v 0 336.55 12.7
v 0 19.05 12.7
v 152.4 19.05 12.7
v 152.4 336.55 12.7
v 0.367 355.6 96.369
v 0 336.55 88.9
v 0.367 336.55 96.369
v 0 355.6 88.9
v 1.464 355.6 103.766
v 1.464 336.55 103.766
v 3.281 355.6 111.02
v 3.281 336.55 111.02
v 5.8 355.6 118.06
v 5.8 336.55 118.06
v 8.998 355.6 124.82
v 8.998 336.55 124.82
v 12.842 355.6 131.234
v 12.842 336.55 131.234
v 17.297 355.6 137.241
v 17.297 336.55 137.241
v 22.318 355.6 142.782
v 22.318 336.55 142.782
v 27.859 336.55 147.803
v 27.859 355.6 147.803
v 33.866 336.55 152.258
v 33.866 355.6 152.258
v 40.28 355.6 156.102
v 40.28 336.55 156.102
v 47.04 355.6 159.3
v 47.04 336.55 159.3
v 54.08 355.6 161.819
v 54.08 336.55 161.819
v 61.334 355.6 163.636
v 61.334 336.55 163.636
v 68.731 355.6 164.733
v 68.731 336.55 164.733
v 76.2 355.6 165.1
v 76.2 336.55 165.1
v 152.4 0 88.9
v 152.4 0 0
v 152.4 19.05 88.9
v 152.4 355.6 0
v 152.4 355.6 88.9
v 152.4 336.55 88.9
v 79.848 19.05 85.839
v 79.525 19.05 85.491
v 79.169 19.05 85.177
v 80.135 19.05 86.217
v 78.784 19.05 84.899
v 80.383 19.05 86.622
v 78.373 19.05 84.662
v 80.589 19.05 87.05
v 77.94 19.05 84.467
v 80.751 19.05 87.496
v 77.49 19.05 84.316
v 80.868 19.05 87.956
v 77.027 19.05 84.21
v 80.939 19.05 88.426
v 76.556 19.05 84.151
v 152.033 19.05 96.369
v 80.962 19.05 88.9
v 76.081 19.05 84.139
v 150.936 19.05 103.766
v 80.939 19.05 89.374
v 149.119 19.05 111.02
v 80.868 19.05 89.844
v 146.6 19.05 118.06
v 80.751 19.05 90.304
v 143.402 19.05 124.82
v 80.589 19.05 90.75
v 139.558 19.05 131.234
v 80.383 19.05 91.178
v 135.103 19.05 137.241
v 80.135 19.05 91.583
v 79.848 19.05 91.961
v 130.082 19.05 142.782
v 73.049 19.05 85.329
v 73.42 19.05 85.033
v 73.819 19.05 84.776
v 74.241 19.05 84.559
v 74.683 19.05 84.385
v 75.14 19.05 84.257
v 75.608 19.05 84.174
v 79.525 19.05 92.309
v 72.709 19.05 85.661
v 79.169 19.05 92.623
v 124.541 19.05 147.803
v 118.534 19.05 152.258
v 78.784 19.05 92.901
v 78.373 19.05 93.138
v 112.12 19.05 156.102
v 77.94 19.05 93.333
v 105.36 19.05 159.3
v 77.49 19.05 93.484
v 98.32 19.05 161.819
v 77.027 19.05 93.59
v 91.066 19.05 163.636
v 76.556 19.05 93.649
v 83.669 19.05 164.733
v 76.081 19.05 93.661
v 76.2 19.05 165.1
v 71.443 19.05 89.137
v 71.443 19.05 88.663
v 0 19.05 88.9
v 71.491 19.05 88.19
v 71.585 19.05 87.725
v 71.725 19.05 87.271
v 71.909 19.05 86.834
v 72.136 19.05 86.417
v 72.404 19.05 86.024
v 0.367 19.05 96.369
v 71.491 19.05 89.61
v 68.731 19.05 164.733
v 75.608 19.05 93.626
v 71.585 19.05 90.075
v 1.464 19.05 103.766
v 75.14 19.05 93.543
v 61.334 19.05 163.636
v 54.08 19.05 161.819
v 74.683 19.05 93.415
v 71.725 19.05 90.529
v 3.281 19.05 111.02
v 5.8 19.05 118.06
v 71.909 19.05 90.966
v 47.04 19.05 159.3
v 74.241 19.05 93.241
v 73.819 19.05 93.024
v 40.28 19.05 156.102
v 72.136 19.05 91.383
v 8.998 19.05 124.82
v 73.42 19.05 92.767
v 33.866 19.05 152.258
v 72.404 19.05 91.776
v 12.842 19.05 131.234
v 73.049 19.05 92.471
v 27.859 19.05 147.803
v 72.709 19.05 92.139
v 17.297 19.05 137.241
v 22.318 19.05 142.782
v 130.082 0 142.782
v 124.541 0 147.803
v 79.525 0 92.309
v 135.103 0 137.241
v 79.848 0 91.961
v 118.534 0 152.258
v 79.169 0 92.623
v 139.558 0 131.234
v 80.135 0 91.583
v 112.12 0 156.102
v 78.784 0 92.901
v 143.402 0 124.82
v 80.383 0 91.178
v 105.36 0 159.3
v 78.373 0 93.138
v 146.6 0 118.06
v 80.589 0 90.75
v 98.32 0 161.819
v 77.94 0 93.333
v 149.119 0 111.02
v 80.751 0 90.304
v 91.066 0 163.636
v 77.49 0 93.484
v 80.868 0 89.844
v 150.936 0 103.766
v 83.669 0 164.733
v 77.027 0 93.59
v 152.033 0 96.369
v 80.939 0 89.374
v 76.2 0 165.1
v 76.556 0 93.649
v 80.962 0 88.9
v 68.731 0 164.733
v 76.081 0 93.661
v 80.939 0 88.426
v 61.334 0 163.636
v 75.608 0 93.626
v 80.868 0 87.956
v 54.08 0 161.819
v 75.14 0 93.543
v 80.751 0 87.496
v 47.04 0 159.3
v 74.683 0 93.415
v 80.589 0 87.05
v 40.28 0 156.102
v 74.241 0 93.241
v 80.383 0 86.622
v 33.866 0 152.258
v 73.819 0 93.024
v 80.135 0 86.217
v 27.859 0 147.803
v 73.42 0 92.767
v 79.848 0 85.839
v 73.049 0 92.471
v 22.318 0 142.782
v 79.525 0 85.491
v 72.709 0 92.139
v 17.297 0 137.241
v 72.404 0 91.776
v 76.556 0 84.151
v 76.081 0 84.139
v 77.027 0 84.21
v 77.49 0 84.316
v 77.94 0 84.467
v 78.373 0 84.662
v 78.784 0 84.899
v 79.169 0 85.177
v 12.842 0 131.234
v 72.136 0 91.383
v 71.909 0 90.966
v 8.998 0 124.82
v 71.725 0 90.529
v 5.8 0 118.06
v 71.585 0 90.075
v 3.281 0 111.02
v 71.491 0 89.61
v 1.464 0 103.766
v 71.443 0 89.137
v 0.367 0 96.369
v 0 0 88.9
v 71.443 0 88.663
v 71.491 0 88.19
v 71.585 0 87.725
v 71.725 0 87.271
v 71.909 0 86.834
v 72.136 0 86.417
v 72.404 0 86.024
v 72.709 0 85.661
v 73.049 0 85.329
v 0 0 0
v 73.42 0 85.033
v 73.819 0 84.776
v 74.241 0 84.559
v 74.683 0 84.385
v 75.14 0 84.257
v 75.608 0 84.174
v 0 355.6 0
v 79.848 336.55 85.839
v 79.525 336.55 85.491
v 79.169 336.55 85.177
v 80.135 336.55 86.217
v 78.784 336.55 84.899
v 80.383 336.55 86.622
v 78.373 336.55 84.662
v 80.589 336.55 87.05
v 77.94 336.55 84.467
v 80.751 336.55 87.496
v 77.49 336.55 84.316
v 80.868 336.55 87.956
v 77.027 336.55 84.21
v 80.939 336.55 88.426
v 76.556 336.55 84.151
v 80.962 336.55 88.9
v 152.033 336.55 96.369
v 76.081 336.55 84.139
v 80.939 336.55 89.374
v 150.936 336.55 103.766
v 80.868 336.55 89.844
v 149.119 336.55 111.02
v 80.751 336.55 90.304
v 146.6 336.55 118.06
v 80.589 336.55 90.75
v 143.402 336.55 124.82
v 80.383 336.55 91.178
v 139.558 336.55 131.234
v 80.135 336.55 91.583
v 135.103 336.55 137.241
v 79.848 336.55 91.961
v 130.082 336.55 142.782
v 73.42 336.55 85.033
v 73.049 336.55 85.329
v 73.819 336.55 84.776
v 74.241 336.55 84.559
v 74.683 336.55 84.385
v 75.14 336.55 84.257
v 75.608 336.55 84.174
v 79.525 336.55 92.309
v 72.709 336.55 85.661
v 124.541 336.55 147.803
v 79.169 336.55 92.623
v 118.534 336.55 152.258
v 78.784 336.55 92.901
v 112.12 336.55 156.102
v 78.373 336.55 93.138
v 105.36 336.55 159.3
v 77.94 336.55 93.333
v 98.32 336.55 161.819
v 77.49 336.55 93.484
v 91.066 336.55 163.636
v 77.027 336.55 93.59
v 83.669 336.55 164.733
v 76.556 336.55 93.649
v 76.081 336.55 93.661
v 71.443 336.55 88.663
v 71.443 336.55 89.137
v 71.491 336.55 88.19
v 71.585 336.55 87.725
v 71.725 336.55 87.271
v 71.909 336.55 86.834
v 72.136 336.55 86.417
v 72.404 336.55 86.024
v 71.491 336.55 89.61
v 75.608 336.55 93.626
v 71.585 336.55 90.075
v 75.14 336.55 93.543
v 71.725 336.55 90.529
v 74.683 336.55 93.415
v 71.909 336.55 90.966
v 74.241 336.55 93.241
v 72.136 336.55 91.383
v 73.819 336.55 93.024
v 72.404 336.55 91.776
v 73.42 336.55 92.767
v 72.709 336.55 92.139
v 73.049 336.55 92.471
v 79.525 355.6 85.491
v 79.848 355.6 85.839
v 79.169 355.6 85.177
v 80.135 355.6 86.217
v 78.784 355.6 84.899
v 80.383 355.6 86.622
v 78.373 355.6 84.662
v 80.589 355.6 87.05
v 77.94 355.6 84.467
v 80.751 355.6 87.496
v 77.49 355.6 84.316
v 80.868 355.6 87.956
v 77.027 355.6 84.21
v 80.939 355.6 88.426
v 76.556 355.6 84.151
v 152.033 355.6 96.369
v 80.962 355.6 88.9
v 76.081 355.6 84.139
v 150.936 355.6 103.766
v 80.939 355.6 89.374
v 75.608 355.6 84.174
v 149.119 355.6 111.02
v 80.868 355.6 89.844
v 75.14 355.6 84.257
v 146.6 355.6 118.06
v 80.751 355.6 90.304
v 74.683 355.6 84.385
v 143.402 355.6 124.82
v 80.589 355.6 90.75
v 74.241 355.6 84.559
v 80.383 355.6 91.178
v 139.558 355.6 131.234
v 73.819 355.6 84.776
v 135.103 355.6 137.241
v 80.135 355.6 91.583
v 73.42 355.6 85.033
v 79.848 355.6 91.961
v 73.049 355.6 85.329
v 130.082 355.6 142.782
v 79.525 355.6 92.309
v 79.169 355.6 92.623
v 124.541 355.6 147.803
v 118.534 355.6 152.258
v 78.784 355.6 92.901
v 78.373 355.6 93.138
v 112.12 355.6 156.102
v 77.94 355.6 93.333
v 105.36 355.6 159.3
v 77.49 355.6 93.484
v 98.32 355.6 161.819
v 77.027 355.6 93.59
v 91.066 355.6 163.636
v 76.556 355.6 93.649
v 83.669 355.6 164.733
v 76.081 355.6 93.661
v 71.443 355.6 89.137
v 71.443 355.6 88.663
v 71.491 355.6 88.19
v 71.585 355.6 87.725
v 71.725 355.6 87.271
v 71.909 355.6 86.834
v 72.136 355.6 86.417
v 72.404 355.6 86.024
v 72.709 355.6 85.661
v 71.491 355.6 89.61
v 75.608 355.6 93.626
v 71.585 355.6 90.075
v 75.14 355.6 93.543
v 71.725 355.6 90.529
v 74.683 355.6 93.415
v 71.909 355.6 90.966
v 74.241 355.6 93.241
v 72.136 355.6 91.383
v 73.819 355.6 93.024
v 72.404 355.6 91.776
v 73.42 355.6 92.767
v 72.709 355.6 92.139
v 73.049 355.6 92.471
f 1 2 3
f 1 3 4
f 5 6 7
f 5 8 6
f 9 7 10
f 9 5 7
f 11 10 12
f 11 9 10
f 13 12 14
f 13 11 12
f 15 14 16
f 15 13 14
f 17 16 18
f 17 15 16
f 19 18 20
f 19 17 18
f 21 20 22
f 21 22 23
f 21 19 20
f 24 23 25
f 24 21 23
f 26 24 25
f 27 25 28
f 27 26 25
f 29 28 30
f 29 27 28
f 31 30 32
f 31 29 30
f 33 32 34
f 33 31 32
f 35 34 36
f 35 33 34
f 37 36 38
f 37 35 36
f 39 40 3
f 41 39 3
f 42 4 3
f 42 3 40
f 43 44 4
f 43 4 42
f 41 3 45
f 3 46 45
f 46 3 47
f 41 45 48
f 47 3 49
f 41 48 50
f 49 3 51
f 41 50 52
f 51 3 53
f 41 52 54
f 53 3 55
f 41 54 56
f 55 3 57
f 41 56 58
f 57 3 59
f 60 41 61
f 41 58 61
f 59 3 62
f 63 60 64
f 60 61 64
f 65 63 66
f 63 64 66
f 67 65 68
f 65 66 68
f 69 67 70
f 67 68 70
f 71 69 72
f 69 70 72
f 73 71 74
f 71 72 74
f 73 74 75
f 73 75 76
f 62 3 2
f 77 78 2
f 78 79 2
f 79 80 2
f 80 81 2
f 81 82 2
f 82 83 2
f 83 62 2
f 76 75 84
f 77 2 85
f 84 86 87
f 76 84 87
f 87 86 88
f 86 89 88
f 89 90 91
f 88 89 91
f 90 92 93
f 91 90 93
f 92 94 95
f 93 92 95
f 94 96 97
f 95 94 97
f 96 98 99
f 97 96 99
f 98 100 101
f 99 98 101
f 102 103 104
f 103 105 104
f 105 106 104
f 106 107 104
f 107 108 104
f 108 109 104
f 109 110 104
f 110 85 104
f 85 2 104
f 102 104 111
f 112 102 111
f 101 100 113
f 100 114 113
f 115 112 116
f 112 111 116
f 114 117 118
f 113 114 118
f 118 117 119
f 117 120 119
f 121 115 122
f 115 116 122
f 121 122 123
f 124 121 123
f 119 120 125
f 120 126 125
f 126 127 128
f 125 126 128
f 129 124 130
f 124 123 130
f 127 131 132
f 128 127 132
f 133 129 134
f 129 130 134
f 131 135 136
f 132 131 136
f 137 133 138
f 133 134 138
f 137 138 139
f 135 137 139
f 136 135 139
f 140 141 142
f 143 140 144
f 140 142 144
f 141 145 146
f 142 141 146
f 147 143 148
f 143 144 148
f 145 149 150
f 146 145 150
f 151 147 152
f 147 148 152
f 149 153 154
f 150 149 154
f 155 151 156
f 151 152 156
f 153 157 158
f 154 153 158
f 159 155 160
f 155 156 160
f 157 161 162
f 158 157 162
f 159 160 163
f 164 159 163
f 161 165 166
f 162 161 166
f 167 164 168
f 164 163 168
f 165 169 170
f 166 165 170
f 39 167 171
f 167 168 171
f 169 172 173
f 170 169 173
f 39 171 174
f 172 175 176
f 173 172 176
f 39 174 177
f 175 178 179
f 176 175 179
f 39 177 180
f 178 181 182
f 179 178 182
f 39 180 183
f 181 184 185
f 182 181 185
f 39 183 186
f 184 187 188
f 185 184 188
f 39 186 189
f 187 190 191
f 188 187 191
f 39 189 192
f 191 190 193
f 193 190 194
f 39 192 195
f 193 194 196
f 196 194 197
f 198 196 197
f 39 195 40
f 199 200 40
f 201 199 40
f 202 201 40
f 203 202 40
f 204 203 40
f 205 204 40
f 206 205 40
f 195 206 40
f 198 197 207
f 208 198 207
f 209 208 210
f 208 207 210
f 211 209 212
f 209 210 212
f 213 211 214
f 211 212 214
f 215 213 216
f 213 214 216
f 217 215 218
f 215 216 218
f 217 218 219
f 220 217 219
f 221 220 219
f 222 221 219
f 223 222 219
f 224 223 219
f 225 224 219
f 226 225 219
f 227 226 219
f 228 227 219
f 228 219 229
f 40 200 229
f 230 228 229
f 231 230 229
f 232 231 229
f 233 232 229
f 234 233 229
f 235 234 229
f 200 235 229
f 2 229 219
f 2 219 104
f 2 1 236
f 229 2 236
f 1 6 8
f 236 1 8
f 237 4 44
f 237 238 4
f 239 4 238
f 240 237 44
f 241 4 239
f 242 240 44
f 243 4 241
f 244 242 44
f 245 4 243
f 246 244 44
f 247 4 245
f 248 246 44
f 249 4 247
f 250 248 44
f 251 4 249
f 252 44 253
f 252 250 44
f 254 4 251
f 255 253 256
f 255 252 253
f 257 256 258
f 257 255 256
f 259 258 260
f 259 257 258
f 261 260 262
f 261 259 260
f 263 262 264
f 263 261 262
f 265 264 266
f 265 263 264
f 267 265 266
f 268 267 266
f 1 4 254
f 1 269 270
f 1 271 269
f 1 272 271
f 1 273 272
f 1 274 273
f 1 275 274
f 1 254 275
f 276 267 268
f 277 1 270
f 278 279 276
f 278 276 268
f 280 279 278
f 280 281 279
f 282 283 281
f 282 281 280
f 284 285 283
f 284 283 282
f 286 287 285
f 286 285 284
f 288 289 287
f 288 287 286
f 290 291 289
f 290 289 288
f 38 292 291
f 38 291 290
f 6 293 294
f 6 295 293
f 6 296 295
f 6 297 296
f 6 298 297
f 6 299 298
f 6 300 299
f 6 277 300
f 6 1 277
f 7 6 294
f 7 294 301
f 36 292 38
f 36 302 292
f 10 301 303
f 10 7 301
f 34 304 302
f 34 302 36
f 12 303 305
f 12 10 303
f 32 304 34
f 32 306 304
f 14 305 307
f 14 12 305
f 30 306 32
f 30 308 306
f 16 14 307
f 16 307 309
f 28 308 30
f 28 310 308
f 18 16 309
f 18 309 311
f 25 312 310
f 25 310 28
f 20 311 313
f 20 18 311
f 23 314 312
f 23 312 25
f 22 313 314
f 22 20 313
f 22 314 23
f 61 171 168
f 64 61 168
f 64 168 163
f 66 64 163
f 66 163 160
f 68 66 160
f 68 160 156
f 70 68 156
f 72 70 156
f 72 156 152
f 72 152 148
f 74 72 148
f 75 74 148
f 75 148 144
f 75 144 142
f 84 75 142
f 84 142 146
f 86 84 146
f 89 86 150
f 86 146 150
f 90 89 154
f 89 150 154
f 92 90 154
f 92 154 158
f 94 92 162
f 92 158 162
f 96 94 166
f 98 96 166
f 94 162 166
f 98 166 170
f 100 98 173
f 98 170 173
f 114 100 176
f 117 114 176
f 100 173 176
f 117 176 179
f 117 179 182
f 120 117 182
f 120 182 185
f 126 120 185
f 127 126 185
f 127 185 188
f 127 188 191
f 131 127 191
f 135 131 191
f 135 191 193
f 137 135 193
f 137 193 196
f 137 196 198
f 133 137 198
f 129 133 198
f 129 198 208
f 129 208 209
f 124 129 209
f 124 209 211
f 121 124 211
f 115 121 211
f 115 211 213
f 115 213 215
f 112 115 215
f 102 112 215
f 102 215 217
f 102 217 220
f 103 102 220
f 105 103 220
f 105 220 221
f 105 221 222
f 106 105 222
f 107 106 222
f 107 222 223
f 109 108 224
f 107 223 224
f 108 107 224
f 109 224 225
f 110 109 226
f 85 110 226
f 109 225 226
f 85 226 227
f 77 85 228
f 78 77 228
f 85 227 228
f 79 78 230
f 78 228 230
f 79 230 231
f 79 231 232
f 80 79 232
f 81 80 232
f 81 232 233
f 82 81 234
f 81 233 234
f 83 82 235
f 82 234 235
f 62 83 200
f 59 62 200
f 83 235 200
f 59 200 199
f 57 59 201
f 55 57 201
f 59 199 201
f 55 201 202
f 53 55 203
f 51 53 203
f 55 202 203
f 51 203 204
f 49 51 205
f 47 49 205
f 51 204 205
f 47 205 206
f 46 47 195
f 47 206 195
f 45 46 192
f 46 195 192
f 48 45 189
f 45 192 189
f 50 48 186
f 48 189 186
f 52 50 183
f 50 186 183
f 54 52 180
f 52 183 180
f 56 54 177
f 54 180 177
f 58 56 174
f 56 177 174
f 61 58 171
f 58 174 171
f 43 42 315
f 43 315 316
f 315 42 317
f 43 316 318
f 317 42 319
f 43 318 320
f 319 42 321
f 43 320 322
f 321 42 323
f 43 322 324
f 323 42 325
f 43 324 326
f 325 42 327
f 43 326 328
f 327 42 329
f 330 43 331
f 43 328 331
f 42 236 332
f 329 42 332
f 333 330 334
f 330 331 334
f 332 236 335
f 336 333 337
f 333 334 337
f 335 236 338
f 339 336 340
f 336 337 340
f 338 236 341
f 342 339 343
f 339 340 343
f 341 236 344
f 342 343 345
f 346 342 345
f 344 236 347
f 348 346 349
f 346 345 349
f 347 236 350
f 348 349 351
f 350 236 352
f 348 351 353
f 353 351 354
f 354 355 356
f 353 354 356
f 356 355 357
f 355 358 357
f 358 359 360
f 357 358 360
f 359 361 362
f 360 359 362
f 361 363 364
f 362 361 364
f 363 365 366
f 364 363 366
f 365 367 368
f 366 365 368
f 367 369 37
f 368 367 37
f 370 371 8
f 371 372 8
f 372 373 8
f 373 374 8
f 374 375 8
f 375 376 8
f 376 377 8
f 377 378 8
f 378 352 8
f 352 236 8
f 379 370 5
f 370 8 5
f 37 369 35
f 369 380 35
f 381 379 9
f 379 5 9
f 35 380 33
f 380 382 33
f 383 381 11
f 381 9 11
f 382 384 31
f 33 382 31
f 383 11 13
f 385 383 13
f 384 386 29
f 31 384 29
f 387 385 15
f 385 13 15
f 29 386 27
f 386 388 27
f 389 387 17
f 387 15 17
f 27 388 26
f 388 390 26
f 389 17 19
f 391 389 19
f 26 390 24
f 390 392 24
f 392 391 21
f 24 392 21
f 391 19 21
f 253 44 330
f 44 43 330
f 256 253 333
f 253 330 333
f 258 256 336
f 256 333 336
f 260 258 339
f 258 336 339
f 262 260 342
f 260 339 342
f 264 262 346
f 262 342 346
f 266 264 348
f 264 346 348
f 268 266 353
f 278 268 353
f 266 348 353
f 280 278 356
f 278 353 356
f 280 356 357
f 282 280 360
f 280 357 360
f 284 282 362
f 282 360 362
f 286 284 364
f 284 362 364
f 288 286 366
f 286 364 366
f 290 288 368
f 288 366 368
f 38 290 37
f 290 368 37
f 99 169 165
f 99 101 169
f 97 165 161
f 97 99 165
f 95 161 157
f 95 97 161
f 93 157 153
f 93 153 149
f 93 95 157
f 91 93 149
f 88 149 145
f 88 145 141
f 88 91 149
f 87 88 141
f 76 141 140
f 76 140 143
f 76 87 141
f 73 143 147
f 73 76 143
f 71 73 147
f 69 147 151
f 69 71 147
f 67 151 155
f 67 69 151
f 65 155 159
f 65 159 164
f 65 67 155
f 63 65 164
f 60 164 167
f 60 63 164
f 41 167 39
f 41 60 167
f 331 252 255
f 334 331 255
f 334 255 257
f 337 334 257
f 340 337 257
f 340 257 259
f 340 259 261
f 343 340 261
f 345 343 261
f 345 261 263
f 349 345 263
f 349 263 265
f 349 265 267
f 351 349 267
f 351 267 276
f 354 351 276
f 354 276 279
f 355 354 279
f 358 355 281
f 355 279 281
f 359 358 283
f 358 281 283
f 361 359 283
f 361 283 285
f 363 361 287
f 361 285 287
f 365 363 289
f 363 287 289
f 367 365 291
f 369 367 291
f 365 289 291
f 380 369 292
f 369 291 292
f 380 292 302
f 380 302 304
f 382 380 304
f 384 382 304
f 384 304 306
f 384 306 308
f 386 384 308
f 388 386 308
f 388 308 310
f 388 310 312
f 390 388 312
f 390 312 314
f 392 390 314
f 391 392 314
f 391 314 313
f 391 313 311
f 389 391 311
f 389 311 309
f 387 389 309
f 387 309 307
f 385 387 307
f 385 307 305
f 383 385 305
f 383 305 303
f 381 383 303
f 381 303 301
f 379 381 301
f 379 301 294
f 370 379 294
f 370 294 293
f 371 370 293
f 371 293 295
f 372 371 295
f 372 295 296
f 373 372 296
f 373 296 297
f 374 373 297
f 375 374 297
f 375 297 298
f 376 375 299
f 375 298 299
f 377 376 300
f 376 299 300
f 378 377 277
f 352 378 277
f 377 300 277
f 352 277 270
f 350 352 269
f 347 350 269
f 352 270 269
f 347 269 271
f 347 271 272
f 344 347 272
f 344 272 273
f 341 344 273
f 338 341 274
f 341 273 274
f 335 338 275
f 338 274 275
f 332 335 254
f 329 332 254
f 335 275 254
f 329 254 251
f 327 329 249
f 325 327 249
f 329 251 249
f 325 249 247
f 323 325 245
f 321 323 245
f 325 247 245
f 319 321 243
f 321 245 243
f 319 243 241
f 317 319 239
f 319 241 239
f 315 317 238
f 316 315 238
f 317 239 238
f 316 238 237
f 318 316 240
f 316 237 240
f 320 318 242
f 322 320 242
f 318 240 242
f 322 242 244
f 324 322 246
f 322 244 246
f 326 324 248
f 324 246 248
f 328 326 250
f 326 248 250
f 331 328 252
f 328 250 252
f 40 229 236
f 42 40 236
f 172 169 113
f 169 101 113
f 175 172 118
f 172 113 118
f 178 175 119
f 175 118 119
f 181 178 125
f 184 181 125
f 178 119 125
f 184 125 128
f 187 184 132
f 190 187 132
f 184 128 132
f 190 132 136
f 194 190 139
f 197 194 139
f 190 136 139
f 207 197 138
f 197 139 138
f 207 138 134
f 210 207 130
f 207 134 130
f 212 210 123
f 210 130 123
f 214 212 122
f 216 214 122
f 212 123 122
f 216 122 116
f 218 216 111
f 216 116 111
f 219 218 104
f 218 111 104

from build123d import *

# Parameters (mm, degrees)
F0_W     = 19.05
F0_H     = 152.4
F0_H_2   = 12.7
F0_W_2   = 317.5
F1_DEPTH = 152.4
F2_R     = 4.7625
F3_DEPTH = 406.4
F4_R     = 76.19999


# Not quite as in the source:
# - a fillet or chamfer is up to 0.001 mm smaller than in the source, because OpenCascade refuses the exact size


with BuildPart() as f1:
    # F0 (on Right) → F1 (new body)
    with BuildSketch(Plane.YZ):
        with Locations((9.525, 88.9)):
            Rectangle(F0_W, F0_H)
        with Locations((9.525, 6.35)):
            Rectangle(F0_W, F0_H_2)
        with Locations((177.8, 6.35)):
            Rectangle(F0_W_2, F0_H_2)
        with Locations((346.075, 88.9)):
            Rectangle(F0_W, F0_H)
        with Locations((346.075, 6.35)):
            Rectangle(F0_W, F0_H_2)
    extrude(amount=F1_DEPTH)

    # F2 (on Front) → F3 (cut)
    with BuildSketch(Plane.XZ):
        with Locations((76.2, 88.9)):
            Circle(F2_R)
    extrude(amount=-F3_DEPTH, mode=Mode.SUBTRACT)

    # F4 (radius 76.2 in the source; OpenCascade refuses exactly that, so slightly less here)
    f4_edges = [f1.edges().sort_by_distance(p)[0] for p in [
        (152.4, 346.075, 165.1),
        (152.4, 9.525, 165.1),
        (0, 9.525, 165.1),
        (0, 346.075, 165.1),
    ]]
    fillet(f4_edges, radius=F4_R)


solid = f1.part
